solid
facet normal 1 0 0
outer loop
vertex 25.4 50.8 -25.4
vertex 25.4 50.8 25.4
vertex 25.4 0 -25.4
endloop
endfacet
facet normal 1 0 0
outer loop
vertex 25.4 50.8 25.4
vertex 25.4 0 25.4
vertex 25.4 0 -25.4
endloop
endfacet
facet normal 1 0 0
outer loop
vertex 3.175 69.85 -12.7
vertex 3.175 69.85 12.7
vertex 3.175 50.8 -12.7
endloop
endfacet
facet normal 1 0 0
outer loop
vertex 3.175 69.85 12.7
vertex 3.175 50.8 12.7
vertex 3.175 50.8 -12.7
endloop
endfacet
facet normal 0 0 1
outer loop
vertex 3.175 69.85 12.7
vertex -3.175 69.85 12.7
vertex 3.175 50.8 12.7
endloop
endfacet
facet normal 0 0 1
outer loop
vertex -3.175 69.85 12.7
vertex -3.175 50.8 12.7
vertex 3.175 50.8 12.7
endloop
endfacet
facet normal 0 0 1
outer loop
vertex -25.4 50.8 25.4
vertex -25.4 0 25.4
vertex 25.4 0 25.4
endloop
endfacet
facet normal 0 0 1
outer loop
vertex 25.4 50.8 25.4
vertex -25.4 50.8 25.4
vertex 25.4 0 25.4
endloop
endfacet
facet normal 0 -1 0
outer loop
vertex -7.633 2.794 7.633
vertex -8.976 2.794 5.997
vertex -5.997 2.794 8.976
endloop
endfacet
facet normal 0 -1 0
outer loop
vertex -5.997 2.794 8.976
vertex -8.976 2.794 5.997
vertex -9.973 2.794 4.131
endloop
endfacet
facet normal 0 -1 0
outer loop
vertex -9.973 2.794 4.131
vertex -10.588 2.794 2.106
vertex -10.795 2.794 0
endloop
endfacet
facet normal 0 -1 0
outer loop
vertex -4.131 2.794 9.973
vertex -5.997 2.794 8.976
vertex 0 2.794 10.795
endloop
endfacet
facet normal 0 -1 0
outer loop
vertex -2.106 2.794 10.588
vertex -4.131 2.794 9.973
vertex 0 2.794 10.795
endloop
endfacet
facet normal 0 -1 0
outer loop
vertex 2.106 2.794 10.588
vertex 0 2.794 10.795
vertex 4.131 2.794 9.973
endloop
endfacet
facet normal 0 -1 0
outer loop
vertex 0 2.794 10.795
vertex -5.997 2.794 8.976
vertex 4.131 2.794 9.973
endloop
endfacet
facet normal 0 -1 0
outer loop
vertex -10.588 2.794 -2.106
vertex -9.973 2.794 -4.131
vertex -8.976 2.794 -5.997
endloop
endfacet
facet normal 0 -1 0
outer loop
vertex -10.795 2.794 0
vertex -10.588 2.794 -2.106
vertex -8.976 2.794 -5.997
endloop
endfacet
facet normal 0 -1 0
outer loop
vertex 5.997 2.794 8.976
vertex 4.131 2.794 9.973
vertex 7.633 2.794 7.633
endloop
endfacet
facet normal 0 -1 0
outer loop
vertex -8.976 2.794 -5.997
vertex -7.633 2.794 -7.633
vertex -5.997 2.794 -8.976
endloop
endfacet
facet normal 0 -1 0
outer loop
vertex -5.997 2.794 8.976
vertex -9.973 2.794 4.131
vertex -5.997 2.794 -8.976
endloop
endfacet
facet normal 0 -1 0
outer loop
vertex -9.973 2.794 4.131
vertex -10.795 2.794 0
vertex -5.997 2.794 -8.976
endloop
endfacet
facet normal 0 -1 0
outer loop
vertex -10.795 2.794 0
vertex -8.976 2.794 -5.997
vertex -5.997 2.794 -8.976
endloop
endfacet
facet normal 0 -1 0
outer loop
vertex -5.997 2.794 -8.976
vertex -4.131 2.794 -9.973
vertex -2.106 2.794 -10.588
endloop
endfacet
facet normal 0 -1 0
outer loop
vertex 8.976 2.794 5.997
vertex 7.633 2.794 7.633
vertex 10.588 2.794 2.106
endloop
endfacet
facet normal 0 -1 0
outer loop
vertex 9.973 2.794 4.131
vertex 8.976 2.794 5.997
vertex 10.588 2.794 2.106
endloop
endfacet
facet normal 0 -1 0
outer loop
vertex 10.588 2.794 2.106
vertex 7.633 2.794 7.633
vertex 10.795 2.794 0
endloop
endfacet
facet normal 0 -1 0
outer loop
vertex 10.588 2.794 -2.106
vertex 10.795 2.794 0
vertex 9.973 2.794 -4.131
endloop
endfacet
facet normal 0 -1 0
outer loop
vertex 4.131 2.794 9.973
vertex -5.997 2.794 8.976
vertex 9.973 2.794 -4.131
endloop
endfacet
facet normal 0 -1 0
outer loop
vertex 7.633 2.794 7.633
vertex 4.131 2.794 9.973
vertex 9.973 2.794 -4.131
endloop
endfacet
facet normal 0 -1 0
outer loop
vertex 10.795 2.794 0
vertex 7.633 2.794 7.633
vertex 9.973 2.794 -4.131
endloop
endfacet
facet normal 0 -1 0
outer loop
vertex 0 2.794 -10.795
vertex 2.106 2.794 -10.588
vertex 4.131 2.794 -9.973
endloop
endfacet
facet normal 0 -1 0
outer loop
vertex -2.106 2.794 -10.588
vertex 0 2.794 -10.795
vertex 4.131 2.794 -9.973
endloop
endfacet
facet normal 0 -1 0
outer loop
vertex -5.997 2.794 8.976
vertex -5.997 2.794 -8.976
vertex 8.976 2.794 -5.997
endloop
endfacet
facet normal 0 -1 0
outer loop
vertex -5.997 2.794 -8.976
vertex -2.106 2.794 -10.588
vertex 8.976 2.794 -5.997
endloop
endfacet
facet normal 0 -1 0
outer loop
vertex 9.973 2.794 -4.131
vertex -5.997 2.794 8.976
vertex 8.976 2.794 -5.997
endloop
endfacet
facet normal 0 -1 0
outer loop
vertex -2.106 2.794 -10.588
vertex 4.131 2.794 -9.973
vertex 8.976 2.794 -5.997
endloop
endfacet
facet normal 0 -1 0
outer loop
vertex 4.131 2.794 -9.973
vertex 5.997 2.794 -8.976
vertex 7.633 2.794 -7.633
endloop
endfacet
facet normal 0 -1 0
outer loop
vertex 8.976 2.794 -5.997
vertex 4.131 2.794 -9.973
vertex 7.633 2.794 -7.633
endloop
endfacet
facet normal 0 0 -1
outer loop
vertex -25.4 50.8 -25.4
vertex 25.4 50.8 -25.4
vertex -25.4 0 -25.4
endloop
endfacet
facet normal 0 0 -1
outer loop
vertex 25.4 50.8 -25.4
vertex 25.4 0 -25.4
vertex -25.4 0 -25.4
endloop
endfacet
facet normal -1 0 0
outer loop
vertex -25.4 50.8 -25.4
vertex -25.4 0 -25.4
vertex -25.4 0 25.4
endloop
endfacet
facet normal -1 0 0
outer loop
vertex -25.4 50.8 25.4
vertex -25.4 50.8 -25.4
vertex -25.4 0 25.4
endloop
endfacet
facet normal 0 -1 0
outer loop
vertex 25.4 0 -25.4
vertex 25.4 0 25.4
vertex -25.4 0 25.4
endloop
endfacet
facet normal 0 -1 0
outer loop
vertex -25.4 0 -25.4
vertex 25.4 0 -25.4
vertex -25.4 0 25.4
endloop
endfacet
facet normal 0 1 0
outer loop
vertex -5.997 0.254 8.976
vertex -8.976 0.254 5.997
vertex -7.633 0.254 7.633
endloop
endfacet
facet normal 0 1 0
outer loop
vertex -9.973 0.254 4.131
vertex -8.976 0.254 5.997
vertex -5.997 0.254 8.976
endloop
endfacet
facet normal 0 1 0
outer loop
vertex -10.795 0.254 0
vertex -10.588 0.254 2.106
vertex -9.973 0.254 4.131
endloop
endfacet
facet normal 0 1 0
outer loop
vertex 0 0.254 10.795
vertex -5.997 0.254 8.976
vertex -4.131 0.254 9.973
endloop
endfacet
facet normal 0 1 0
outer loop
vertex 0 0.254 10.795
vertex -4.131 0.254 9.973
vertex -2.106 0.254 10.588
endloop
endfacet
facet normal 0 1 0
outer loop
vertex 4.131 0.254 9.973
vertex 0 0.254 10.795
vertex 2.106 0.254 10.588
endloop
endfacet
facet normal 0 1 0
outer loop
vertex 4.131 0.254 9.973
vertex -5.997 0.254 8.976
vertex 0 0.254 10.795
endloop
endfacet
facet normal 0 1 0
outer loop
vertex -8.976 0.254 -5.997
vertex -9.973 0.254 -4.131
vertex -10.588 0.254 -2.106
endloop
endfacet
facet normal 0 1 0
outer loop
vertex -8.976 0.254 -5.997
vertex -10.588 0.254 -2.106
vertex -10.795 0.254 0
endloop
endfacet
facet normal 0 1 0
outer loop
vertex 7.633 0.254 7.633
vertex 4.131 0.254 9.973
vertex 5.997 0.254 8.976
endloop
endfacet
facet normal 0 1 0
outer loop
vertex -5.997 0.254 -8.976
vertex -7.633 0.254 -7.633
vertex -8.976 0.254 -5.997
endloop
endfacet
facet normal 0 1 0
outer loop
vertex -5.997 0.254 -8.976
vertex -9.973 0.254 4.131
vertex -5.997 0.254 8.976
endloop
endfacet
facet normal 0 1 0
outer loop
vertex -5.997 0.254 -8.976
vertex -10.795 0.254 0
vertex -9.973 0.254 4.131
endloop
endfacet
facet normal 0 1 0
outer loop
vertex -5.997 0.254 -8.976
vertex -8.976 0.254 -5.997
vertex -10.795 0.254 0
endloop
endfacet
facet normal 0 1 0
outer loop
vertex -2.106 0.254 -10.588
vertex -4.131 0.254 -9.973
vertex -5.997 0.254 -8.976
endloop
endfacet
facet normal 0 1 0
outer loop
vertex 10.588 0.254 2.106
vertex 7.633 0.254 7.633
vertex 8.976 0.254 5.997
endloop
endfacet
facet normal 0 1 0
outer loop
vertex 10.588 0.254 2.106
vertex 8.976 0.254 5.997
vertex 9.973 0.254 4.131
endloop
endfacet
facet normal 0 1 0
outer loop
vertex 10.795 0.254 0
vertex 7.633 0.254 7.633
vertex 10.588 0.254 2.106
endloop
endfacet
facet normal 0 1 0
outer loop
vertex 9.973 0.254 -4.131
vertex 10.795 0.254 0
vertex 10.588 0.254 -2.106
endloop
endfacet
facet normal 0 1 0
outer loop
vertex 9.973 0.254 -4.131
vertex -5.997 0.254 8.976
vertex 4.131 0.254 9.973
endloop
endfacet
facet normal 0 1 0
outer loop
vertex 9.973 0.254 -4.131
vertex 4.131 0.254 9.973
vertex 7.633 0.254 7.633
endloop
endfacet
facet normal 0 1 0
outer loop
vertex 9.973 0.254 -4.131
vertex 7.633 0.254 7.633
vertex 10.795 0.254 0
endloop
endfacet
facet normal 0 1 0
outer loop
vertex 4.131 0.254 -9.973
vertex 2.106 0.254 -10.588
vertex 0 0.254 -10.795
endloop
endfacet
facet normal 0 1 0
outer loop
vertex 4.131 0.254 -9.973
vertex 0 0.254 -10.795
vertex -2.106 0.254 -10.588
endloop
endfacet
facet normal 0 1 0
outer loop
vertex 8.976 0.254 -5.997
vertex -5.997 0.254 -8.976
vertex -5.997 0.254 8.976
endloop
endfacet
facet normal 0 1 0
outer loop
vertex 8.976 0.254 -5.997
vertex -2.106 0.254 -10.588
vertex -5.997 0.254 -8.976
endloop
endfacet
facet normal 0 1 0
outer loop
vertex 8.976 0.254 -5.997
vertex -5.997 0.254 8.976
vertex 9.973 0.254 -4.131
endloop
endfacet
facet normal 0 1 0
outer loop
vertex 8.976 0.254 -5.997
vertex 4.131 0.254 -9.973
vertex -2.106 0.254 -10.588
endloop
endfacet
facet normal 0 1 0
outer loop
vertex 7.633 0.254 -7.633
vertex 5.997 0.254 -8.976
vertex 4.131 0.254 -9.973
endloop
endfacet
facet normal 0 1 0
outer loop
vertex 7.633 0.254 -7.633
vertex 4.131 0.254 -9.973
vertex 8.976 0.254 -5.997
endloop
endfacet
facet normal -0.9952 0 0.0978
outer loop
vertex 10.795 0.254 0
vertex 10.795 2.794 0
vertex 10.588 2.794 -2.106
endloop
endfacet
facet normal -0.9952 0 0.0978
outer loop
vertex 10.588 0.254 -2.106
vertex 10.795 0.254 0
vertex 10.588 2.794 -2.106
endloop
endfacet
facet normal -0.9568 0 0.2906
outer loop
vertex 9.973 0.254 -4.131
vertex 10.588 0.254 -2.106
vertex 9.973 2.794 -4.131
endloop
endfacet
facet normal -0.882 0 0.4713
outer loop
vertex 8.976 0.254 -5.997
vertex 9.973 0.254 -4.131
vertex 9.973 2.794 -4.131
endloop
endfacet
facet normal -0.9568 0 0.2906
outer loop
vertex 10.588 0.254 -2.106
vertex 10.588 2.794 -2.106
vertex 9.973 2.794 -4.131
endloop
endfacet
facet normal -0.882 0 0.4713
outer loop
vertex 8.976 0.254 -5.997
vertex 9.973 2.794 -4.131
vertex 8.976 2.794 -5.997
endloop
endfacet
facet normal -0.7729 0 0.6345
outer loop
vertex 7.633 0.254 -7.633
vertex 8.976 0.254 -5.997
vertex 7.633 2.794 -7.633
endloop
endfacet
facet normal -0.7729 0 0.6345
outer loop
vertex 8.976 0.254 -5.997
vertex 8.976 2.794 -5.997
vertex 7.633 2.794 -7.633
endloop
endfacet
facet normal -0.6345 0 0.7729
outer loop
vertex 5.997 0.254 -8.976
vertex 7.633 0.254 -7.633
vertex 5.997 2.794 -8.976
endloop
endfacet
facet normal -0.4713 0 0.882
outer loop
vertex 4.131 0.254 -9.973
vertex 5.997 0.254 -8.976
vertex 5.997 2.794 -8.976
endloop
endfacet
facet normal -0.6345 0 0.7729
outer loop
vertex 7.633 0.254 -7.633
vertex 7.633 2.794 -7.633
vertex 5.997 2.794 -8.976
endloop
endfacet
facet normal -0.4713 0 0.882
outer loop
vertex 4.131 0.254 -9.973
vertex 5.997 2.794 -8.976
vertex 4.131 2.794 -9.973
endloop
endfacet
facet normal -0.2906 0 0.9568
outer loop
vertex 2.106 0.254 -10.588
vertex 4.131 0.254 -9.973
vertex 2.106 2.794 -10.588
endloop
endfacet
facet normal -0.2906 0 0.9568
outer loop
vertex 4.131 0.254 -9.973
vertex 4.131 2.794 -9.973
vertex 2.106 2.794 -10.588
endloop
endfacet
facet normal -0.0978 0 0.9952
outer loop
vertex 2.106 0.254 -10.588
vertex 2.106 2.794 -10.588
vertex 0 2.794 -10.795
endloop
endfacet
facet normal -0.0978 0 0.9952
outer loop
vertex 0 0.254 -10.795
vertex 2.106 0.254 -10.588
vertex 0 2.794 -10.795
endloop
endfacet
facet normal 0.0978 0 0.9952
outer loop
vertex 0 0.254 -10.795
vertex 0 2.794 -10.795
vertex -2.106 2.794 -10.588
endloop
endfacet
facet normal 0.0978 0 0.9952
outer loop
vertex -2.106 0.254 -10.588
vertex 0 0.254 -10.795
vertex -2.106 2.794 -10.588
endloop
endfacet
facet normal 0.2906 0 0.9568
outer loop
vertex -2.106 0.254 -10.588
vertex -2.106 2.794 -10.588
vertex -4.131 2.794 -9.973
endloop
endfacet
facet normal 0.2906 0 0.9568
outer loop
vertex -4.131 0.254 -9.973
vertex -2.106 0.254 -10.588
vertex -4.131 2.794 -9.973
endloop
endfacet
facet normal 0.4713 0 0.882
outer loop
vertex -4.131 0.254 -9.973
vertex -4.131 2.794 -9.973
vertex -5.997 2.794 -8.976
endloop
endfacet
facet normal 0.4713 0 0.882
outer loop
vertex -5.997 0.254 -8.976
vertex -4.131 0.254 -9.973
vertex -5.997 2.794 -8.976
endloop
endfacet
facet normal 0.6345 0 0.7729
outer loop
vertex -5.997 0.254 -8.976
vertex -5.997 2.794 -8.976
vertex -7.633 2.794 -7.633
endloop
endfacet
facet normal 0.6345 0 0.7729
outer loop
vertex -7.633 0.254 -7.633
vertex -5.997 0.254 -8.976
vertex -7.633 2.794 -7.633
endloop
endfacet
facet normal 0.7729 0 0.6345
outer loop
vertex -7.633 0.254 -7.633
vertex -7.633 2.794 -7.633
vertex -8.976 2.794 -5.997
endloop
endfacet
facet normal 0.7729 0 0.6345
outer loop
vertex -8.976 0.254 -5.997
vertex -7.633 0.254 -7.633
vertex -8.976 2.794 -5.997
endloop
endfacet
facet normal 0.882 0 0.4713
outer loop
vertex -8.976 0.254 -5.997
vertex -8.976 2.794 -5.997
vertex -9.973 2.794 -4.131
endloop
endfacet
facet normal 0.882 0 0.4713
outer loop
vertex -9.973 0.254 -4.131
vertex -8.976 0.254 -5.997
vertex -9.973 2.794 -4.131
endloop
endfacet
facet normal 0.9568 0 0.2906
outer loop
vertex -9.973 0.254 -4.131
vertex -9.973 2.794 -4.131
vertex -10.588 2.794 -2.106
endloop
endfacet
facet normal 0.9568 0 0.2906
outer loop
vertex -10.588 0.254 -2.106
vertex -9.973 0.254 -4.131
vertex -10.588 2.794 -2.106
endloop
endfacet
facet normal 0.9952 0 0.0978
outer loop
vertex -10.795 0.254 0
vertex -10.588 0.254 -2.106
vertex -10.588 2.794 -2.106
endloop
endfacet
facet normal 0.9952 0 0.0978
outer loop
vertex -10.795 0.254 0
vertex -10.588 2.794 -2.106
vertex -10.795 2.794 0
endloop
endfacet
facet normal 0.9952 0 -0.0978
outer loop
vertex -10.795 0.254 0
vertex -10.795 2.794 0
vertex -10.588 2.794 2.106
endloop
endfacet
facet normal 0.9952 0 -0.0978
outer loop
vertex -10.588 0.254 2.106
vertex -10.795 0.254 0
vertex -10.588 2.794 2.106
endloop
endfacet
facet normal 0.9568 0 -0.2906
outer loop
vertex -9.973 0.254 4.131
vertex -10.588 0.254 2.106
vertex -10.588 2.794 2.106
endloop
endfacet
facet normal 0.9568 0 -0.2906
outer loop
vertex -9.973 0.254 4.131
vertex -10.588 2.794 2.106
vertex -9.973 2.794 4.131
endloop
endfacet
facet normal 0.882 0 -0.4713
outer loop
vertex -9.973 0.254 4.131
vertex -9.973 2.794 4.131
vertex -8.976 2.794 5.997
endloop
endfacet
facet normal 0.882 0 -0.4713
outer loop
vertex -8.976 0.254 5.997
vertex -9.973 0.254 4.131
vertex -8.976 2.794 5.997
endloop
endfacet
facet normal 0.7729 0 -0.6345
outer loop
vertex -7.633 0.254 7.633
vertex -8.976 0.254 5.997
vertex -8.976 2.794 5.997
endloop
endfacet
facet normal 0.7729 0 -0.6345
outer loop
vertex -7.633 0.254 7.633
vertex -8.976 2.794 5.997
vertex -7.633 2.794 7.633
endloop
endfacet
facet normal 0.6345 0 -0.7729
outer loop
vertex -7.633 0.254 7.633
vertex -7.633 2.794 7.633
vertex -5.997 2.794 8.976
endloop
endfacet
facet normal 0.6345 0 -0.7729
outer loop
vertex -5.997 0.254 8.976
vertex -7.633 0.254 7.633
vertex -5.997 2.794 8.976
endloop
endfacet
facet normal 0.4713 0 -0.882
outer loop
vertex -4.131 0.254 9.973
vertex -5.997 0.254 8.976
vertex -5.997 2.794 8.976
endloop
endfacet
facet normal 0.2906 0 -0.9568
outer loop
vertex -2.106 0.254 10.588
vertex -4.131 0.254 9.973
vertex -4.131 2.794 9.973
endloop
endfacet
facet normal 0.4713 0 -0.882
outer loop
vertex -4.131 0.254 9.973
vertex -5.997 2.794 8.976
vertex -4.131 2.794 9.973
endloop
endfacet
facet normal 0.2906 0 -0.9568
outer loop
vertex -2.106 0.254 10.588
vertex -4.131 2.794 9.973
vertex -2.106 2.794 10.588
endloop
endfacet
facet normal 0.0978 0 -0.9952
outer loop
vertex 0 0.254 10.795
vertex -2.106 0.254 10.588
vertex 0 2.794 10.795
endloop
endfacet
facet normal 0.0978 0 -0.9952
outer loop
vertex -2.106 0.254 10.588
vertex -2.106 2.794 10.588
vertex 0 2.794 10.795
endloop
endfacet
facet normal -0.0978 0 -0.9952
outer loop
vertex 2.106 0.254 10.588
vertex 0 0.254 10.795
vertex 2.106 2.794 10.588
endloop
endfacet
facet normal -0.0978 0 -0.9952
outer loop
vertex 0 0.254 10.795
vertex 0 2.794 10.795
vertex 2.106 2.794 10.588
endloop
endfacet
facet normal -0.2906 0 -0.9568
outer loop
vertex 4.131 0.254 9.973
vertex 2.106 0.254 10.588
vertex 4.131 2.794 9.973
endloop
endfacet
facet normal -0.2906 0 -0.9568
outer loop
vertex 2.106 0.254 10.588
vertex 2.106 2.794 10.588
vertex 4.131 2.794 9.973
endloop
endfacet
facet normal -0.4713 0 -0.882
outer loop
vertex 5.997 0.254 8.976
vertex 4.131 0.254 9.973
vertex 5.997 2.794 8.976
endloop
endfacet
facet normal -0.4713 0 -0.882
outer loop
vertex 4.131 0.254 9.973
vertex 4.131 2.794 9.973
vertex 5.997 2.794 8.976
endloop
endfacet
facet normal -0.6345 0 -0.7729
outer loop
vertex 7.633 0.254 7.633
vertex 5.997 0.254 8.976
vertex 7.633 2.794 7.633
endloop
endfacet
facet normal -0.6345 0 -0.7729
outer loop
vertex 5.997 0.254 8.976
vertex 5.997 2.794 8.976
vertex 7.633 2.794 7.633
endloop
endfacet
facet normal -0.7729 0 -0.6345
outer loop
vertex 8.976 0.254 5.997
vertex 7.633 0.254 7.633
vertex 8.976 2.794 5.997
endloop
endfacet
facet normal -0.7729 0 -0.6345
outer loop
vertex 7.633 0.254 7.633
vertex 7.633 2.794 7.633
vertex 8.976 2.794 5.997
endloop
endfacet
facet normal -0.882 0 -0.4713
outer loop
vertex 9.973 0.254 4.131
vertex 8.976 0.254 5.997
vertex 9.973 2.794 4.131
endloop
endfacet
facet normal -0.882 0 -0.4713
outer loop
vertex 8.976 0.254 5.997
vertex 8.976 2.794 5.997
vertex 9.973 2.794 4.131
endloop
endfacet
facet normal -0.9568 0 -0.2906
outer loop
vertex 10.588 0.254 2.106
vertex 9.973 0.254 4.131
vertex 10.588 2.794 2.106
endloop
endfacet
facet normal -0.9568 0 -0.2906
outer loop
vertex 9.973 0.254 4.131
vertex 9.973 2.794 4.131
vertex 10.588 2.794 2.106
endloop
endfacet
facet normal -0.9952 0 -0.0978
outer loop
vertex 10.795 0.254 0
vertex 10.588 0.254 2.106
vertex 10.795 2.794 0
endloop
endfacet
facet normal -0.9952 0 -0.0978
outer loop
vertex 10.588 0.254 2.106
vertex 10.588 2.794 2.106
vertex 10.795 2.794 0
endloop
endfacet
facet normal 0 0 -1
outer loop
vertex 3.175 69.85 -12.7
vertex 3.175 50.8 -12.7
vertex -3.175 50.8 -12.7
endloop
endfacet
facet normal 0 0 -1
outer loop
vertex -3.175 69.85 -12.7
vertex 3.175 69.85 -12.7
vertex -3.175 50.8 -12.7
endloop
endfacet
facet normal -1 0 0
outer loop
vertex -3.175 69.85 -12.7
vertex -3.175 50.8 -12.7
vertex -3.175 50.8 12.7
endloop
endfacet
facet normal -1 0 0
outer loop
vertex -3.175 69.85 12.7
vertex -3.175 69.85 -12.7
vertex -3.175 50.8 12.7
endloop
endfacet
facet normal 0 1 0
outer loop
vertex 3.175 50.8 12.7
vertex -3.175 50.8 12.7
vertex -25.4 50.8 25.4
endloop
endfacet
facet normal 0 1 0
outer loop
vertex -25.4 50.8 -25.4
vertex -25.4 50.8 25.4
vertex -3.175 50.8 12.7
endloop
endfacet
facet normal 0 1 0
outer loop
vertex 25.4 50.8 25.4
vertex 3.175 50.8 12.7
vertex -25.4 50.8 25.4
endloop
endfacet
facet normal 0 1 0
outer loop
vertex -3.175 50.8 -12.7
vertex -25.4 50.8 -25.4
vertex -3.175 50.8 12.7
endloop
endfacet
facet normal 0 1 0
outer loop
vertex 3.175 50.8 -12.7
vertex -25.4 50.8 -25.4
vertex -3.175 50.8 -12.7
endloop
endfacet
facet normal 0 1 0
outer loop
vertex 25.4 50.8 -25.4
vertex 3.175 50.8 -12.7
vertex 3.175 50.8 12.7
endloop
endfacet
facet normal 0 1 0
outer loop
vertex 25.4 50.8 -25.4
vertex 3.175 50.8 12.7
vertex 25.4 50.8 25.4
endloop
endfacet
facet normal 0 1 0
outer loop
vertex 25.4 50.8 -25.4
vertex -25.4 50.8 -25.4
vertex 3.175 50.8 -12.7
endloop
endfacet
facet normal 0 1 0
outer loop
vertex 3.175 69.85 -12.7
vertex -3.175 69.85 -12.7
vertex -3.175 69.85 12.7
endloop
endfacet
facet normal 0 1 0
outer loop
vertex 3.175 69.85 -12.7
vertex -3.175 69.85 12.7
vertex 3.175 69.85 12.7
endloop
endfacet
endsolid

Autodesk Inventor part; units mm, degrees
ref_plane "YZ Plane" through (0, 0, 0) normal (1, 0, 0) x (0, 1, 0)
ref_plane "XZ Plane" through (0, 0, 0) normal (0, 1, 0) x (-1, 0, 0)
ref_plane "XY Plane" through (0, 0, 0) normal (0, 0, 1) x (1, 0, 0)
sketch "Sketch1" plane through (0, 0, 0) normal (0, 1, 0) x (-1, 0, 0)
  line L0 (-25.4, -25.4) -> (25.4, -25.4)
  line L1 (25.4, -25.4) -> (25.4, 25.4)
  line L2 (25.4, 25.4) -> (-25.4, 25.4)
  line L3 (-25.4, 25.4) -> (-25.4, -25.4)
  point P0 (0, 0)
  dimension "d0" = 50.8
  dimension "d1" = 50.8
extrude "Extrusion1" add sketch "Sketch1" along normal blind 2.794
sketch "Sketch2" plane through (0, 2.794, 0) normal (0, 1, 0) x (1, 0, 0)
  circle A0 centre (0, 0) radius 10.795
  dimension "d4" = 21.59
extrude "Extrusion2" cut sketch "Sketch2" against normal blind 2.54
sketch "Sketch3" plane through (0, 2.794, 0) normal (0, 1, 0) x (1, 0, 0)
  point P0 (0, 0)
sketch "Sketch4" plane through (0, 2.794, 0) normal (0, 1, 0) x (1, 0, 0)
  line L0 (25.4, 25.4) -> (-25.4, 25.4) projected
  line L1 (-25.4, -25.4) -> (25.4, -25.4) projected
  line L2 (25.4, 25.4) -> (-25.4, 25.4)
  line L3 (-25.4, 25.4) -> (-25.4, -25.4)
  line L4 (-25.4, -25.4) -> (25.4, -25.4)
  line L5 (25.4, -25.4) -> (25.4, 25.4)
  point P0 (0, 0)
extrude "Extrusion3" add sketch "Sketch4" along normal blind 48.006
sketch "Sketch5" plane through (0, 50.8, 0) normal (0, 1, 0) x (1, 0, 0)
  line L0 (3.175, 12.7) -> (-3.175, 12.7)
  line L1 (-3.175, 12.7) -> (-3.175, -12.7)
  line L2 (-3.175, -12.7) -> (3.175, -12.7)
  line L3 (3.175, -12.7) -> (3.175, 12.7)
  point P0 (0, 0)
  dimension "d9" = 6.35
  dimension "d10" = 25.4
extrude "Extrusion4" add sketch "Sketch5" along normal blind 19.05
properties part number "block for magnet"
